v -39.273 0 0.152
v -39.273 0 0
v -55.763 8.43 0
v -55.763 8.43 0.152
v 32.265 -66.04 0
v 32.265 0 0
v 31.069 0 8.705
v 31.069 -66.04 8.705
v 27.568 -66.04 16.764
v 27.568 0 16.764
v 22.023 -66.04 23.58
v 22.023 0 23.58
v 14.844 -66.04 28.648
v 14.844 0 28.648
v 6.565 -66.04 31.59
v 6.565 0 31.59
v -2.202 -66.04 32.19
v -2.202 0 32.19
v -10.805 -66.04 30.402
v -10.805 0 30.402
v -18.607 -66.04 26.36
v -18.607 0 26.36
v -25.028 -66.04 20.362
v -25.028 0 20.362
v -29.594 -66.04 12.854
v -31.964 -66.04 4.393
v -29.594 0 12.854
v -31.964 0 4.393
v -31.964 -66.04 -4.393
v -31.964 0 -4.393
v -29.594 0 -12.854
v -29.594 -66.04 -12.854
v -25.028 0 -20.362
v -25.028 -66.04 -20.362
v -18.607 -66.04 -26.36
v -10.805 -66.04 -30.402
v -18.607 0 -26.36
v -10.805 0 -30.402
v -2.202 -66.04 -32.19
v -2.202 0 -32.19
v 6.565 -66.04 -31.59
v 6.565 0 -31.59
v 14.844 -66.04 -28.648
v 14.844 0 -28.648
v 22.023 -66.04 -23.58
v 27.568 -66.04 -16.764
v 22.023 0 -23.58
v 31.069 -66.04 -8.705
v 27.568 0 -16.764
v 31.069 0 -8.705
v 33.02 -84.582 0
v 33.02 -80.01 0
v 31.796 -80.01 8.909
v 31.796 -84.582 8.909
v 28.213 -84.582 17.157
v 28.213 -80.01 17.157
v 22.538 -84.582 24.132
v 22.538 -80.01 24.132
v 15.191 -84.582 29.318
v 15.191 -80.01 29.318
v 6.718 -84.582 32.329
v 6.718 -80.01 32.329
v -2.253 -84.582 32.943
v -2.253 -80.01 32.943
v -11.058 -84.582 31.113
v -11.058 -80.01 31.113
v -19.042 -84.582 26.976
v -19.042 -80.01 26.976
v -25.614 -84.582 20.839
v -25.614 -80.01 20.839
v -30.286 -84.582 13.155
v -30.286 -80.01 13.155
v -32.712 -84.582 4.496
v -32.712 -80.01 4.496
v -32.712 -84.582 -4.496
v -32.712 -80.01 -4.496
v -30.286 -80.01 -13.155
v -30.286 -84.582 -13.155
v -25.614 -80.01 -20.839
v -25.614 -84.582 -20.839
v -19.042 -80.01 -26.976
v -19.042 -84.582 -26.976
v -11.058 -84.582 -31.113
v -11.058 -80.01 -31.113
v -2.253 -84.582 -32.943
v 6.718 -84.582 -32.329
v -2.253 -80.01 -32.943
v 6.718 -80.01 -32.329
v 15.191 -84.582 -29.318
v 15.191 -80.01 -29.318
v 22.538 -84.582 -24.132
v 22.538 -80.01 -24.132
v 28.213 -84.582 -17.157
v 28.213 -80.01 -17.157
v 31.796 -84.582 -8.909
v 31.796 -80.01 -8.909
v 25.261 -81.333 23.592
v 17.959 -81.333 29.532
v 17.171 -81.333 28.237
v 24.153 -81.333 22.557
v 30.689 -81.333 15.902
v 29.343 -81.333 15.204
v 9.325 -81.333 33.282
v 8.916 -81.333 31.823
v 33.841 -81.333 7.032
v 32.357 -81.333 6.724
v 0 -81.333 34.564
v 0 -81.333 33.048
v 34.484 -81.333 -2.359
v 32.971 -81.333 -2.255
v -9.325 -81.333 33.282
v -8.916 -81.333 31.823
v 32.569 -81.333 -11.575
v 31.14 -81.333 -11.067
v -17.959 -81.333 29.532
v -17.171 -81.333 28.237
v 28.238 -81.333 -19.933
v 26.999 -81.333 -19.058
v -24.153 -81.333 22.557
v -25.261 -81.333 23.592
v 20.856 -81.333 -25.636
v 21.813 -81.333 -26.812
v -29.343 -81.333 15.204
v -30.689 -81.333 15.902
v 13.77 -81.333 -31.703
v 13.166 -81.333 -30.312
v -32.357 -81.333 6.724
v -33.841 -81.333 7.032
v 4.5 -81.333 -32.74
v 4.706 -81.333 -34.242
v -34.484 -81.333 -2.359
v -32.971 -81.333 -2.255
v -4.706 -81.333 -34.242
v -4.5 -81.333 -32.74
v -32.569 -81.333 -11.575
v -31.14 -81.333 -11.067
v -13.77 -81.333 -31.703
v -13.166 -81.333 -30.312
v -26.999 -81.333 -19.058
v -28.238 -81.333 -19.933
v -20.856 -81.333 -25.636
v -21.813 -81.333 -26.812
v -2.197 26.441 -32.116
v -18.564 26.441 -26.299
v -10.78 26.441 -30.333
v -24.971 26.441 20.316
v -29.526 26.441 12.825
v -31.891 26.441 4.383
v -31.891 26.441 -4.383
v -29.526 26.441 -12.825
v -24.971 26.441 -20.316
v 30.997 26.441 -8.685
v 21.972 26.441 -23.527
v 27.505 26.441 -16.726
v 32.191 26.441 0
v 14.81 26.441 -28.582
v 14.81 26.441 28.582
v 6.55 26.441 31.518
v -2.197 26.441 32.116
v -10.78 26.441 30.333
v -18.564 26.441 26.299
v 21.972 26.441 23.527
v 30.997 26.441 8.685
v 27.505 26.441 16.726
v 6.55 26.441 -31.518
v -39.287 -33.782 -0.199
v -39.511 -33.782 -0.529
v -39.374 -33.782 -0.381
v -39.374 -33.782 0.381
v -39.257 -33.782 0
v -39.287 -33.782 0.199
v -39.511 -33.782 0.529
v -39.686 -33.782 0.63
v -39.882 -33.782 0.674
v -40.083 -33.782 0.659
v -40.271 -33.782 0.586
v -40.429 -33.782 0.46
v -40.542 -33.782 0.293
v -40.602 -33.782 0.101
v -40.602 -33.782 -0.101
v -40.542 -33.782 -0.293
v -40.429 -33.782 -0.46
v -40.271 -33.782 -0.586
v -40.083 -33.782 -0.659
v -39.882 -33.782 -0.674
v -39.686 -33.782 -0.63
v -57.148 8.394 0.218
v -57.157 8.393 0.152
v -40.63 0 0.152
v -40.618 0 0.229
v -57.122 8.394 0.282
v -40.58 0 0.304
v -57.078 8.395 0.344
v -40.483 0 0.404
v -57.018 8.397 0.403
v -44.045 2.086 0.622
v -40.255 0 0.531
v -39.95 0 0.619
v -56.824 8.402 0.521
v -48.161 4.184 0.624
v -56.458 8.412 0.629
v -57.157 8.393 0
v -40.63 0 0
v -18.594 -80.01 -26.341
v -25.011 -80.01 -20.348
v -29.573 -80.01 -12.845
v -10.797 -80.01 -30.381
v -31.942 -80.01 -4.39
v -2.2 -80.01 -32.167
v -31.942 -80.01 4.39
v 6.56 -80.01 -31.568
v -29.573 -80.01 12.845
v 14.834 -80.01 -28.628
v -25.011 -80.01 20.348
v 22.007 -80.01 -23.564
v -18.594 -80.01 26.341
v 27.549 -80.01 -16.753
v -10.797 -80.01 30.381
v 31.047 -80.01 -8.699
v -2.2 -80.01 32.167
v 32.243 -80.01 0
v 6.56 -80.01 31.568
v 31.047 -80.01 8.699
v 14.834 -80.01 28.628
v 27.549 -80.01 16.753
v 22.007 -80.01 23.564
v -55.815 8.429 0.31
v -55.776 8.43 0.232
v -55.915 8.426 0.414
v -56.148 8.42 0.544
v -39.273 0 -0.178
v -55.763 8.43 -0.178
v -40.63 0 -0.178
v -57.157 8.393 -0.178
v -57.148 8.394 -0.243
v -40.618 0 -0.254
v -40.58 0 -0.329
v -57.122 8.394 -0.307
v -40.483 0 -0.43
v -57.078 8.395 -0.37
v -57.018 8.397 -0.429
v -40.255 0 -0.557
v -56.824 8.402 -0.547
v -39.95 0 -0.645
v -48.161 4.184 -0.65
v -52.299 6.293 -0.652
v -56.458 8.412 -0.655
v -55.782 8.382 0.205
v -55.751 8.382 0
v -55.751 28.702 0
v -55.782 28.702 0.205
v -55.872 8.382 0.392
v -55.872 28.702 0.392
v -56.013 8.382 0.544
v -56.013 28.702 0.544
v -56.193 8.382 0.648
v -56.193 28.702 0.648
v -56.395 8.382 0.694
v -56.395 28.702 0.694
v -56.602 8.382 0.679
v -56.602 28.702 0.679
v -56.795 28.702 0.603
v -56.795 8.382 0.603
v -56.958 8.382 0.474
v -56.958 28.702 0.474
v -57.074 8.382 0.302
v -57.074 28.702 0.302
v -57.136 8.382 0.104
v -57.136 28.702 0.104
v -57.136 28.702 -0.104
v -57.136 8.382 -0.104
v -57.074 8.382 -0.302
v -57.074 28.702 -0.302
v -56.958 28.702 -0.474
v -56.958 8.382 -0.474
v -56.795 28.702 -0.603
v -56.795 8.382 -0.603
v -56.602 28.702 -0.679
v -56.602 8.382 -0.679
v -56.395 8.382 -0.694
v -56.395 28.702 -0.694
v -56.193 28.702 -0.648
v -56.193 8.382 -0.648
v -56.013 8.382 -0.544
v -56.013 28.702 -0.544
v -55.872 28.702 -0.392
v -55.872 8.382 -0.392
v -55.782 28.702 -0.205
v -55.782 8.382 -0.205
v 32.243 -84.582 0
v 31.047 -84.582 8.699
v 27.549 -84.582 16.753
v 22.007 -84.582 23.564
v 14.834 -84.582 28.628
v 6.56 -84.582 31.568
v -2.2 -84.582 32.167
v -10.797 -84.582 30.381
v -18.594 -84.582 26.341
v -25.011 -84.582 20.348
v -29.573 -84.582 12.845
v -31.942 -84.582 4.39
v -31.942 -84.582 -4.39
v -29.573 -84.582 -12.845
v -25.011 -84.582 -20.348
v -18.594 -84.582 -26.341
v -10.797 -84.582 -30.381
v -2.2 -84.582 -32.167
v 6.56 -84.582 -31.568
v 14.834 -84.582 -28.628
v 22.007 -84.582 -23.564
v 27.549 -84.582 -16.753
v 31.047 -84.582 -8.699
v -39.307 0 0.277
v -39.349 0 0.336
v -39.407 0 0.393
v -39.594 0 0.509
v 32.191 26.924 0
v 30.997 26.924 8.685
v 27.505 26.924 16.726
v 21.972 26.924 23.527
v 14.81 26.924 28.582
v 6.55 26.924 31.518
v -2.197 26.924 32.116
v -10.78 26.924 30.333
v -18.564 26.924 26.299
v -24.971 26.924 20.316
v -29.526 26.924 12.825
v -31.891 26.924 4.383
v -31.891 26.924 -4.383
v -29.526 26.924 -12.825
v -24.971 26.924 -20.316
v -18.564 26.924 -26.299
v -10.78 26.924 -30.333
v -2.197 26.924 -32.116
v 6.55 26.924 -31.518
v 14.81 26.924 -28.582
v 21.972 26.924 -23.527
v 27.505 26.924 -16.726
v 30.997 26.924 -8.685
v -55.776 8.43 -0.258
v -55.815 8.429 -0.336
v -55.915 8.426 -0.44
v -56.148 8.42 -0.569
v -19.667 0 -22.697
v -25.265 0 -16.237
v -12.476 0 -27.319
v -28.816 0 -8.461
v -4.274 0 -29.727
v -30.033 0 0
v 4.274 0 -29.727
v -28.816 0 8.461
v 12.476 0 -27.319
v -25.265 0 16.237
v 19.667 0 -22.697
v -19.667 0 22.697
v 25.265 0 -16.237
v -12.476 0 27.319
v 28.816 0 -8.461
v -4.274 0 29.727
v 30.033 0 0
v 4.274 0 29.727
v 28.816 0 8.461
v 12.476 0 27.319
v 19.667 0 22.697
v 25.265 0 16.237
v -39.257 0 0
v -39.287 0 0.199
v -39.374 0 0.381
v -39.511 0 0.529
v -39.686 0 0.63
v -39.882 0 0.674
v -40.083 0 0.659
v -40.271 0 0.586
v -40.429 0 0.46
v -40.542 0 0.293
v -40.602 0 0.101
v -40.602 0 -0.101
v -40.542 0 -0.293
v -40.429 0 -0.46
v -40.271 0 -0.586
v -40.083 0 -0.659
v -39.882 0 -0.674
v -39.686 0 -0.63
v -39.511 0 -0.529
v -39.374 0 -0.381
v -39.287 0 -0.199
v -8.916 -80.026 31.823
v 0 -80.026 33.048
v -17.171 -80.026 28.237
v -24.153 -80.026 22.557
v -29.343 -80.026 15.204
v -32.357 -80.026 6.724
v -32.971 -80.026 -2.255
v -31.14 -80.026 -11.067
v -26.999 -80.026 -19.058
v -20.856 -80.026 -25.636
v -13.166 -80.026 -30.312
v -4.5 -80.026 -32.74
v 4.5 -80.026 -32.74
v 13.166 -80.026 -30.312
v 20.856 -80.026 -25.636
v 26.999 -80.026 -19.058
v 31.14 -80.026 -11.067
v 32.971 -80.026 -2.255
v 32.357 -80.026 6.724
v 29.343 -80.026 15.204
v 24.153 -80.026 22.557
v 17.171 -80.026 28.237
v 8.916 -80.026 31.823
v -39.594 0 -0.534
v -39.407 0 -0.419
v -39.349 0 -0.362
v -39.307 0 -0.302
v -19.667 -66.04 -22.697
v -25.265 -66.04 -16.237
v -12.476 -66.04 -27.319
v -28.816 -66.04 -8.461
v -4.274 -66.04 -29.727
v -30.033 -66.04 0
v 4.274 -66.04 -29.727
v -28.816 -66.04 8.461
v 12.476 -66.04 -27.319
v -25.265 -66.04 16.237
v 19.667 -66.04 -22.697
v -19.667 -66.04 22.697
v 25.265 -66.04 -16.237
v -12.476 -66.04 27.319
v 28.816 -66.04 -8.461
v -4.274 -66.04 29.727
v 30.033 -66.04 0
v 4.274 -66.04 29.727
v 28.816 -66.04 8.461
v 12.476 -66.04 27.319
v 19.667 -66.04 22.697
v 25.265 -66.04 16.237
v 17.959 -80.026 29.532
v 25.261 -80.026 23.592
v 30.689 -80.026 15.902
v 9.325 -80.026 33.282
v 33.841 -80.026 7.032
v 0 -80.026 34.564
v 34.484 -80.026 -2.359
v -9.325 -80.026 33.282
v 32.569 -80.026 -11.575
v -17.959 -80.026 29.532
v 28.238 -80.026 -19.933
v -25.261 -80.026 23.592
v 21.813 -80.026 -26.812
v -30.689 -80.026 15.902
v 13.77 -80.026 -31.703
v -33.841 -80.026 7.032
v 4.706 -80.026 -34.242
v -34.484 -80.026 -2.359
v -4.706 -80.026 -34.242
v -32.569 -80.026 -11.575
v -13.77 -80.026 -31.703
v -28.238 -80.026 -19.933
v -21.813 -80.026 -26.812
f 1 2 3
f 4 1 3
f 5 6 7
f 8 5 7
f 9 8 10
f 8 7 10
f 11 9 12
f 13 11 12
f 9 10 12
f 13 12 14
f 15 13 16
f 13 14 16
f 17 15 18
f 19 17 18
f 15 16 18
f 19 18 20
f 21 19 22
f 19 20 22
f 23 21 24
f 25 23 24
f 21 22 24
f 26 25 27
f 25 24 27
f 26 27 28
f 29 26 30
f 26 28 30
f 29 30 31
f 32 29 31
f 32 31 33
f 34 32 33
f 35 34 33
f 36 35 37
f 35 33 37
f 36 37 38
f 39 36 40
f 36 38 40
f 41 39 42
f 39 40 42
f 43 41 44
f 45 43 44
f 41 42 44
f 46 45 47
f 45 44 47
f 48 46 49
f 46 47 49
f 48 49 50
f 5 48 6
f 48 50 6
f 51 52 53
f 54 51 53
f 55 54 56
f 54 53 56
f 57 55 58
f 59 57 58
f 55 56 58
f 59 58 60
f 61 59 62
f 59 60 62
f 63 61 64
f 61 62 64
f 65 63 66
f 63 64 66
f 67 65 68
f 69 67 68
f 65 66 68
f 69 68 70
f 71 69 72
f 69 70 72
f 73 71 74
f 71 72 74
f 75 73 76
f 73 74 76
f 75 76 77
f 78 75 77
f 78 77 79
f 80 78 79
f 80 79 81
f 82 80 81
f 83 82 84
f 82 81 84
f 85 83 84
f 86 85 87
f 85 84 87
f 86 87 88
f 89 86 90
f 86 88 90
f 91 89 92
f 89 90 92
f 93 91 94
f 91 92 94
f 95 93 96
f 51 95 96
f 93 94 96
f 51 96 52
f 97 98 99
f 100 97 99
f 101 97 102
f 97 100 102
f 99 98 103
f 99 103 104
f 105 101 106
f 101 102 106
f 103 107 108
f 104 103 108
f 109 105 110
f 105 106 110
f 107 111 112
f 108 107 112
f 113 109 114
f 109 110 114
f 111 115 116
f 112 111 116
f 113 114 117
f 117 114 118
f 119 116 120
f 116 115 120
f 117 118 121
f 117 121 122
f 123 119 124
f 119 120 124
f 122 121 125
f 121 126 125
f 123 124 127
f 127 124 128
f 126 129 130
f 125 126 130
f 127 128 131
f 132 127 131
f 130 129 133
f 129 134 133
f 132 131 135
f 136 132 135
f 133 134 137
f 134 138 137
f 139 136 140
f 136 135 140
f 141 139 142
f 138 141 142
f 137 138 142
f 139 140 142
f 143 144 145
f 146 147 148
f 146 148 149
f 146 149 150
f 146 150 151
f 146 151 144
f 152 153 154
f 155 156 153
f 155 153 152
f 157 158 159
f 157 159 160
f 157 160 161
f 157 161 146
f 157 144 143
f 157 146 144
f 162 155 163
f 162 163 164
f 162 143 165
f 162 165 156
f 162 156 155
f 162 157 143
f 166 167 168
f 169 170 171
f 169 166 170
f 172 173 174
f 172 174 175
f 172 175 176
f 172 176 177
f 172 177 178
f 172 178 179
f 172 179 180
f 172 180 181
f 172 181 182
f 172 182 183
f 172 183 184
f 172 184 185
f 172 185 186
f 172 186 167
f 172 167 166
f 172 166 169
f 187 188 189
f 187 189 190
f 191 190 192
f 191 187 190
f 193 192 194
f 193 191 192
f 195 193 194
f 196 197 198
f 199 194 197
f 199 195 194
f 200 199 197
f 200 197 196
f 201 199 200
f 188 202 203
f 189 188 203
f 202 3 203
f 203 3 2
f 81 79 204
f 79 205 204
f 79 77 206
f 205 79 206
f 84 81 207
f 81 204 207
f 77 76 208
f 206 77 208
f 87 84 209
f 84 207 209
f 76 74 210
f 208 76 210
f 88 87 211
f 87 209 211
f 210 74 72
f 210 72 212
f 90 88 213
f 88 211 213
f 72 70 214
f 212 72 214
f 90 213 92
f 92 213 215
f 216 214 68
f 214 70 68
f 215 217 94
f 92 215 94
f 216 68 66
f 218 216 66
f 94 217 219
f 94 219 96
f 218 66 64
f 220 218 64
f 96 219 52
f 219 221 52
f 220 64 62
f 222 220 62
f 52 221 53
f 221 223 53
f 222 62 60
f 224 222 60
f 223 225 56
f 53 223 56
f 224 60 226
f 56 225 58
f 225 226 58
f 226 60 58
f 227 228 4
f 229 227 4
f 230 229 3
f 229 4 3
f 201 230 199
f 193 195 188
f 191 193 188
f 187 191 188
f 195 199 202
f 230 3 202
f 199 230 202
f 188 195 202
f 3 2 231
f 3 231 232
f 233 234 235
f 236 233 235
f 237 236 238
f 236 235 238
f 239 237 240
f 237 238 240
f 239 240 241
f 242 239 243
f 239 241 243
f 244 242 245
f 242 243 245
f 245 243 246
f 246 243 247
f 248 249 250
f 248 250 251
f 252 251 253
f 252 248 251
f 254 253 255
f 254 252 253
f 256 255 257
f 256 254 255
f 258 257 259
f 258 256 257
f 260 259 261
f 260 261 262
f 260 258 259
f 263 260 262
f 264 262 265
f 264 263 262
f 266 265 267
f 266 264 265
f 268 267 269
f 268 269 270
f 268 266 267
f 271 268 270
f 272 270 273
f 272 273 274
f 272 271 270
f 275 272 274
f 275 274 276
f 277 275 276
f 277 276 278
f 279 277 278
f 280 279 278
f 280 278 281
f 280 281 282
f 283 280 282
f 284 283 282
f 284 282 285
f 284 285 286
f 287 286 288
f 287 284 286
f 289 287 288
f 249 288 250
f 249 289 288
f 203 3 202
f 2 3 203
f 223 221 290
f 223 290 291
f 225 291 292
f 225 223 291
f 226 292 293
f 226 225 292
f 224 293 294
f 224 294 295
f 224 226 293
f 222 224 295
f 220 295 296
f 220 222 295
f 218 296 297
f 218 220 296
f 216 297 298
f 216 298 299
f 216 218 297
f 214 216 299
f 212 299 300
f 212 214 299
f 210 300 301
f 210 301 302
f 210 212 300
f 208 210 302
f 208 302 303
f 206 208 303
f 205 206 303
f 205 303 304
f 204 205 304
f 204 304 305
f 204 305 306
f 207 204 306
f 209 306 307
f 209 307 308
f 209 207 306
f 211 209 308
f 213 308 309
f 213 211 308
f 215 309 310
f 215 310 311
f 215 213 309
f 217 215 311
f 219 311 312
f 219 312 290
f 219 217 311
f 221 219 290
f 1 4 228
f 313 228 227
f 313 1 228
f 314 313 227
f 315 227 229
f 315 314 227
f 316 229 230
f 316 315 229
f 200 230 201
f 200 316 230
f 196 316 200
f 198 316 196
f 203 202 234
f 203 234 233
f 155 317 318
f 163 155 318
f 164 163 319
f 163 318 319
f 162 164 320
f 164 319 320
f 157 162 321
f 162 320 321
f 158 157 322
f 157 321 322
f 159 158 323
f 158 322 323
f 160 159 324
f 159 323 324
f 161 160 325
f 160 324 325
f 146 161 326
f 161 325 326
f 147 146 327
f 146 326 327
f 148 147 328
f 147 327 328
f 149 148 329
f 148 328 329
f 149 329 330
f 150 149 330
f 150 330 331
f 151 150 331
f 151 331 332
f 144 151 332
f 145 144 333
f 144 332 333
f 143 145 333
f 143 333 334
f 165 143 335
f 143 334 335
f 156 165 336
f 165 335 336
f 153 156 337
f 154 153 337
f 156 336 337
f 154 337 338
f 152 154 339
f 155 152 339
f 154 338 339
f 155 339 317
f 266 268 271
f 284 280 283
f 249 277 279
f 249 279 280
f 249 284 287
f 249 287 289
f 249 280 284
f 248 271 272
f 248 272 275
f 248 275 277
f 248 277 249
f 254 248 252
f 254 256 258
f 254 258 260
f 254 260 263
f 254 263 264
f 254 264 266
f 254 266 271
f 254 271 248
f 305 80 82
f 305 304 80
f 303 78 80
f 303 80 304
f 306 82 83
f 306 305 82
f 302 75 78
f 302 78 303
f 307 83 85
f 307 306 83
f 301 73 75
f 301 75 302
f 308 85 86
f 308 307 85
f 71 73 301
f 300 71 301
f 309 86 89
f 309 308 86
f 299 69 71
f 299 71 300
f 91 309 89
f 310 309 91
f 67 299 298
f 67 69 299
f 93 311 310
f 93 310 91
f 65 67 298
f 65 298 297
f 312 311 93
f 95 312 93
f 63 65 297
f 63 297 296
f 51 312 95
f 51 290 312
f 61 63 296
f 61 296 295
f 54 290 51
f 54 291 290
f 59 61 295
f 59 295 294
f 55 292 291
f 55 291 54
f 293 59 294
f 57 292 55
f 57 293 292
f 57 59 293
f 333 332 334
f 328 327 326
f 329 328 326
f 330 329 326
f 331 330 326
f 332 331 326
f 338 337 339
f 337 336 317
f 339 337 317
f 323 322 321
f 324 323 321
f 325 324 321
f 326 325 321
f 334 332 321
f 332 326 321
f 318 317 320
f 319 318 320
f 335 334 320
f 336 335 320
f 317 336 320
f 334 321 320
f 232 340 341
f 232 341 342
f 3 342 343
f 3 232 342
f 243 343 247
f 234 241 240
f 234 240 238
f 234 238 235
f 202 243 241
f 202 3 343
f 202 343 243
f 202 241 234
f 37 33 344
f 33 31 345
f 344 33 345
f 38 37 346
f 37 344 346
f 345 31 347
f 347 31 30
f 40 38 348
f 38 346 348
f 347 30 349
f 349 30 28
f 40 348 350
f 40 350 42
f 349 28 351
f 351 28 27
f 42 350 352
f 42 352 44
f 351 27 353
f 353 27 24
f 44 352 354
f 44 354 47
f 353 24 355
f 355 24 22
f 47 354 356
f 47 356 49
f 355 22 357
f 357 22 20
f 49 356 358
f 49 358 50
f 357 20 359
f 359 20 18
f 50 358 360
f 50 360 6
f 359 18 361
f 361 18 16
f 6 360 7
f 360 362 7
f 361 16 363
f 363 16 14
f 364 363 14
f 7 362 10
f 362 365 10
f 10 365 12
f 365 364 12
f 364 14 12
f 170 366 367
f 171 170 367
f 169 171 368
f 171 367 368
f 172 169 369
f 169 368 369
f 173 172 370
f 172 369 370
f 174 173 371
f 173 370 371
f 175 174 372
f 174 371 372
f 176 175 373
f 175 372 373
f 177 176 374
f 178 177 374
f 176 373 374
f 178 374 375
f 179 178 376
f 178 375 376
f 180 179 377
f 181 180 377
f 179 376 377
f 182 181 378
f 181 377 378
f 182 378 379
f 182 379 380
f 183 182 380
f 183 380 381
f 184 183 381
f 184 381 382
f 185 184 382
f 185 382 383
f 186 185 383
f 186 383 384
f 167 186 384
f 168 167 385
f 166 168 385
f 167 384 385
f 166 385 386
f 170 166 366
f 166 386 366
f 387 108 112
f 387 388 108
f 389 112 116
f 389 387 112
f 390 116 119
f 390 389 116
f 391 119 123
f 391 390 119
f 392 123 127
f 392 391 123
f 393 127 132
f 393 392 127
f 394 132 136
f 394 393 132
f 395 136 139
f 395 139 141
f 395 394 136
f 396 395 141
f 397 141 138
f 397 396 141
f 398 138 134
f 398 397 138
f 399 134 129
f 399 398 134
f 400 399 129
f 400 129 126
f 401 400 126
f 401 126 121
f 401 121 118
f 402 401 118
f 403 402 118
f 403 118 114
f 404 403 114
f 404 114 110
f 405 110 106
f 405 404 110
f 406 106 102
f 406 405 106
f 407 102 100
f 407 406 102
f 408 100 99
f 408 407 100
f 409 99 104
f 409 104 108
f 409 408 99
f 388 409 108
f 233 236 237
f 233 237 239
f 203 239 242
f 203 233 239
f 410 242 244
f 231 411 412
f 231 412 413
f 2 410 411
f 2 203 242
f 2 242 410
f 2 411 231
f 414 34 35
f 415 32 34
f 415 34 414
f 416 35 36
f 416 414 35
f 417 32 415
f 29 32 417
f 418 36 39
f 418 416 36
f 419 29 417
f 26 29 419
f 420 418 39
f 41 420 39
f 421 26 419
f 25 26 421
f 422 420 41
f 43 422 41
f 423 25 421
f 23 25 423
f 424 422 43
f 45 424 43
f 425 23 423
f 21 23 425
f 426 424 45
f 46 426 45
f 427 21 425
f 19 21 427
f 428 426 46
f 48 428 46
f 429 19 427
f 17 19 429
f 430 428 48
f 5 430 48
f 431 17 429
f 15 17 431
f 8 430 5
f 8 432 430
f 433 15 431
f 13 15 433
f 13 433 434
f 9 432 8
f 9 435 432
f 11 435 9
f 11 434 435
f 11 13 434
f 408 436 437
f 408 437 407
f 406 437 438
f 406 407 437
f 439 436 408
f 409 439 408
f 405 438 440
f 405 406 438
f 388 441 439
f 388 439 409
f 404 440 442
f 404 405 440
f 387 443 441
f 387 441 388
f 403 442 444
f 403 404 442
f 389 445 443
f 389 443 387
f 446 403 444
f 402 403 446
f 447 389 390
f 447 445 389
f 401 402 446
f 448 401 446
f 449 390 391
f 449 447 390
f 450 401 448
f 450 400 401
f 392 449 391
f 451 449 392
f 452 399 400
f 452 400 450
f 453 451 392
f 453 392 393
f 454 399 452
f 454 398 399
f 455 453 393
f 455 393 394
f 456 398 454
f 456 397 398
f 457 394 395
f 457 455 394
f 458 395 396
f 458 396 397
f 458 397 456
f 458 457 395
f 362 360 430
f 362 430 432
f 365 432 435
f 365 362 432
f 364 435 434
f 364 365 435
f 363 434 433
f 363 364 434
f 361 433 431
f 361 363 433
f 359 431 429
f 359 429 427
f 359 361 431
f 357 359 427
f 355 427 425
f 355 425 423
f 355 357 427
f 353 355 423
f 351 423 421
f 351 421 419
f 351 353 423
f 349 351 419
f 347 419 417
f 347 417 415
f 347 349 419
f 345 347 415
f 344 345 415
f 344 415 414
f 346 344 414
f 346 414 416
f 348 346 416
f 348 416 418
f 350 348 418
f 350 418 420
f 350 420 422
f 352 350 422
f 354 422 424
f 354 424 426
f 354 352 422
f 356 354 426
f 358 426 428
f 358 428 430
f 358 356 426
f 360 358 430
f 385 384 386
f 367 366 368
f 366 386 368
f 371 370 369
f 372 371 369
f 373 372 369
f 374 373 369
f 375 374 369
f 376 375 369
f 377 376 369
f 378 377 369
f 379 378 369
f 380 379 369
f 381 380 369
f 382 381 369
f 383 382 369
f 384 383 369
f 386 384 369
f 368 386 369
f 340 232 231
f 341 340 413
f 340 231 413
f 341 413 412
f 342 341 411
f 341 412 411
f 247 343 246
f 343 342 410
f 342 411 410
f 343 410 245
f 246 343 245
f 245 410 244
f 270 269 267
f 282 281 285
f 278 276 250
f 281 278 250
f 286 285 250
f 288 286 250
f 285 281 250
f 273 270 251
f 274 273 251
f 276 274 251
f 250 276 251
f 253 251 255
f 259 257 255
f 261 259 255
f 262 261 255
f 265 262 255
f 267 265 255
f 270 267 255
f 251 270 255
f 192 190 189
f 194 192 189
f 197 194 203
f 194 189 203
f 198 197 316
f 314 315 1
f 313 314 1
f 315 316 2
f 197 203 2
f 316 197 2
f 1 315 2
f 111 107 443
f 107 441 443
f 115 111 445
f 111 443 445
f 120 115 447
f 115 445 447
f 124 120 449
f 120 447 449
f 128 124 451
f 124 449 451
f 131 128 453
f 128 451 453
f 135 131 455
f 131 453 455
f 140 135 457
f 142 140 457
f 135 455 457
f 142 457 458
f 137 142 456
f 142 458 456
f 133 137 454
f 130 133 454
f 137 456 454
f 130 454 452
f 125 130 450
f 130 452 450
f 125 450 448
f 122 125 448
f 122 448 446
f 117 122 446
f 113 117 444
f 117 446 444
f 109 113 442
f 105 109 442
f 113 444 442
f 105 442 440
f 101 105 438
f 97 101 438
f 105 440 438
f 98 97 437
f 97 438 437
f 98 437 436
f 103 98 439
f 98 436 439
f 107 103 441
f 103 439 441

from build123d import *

# Parameters (mm, degrees)
F0_R           = 32.2649845467
F0_R_2         = 30.0329002684
F1_DEPTH       = 66.04
F3_R           = 33.02
F3_R_2         = 32.2425514632
F4_DEPTH       = 4.572
F5_W           = 1.3068169355
F5_H           = 1.5159137547
F9_R           = 32.1912372863
F10_DEPTH      = 0.4826
F11_R          = 0.6763051709
F12_DEPTH      = 33.782
F14_R          = 0.6962354259
F15_DEPTH      = 20.32
F17_DEPTH      = 0.6604
F18_DEPTH      = 0.6858
F19_T1_DEPTH   = 21.0597633564
F19_T3_DEPTH   = 21.0757959369
F19_2_T1_DEPTH = 21.0597633564
F19_2_T3_DEPTH = 21.0757959369


# Not quite as in the source:
# - a fillet or chamfer that OpenCascade refuses, or shapes differently, is made with other operations: its cross-section is extruded or revolved along the edge and cut away or added


with BuildPart() as f1:
    # F0 (on Front) → F1 (new body)
    with BuildSketch(Plane.XZ):
        Circle(F0_R)
        Circle(F0_R_2, mode=Mode.SUBTRACT)
    extrude(amount=F1_DEPTH)


with BuildPart() as f4:
    # F3 (on offset) → F4 (new body)
    with BuildSketch(Plane.XZ.offset(80.01)):
        Circle(F3_R)
        Circle(F3_R_2, mode=Mode.SUBTRACT)
    extrude(amount=F4_DEPTH)


with BuildPart() as f7:
    # F5 (on Right) → F7 (revolve)
    with BuildSketch(Plane.YZ):
        with Locations((-80.6791931391, 33.8062625378)):
            Rectangle(F5_W, F5_H)
    revolve(axis=Axis((0, -220.3602194786, 0), (0, -1, 0)))


with BuildPart() as f10:
    # F9 (on offset) → F10 (new body)
    with BuildSketch(Plane.XZ.offset(-26.924)):
        Circle(F9_R)
    extrude(amount=F10_DEPTH)


with BuildPart() as f12:
    # F11 (on Front) → F12 (new body)
    with BuildSketch(Plane.XZ):
        with Locations((-39.9328246713, 0)):
            Circle(F11_R)
    extrude(amount=F12_DEPTH)


with BuildPart() as f15:
    # F14 (on offset) → F15 (new body)
    with BuildSketch(Plane.XZ.offset(-8.382)):
        with Locations((-56.4471445978, 0)):
            Circle(F14_R)
    extrude(amount=-F15_DEPTH)


with BuildPart() as f17:
    # F16 (on Top) → F17 (new body)
    with BuildSketch(Plane.XY):
        Polygon((-39.2730757594, 0), (-55.7629354298, 8.4300749004), (-57.1569614112, 8.3933901042), (-40.630415082, 0), align=None)
    extrude(amount=F17_DEPTH)


with BuildPart() as f18:
    # F18 (new): a face of the model
    f18_faces = [f17.part.faces().sort_by_distance(p)[0] for p in [
        (-48.3112762863, 4.2598390002, 0),
    ]]
    extrude(f18_faces, amount=F18_DEPTH)

    # F19: fillet of radius 0.508 on 2 edges, made by hand

    # F19_s2 → F19_t1 (cut)
    with BuildSketch(Plane(origin=(-30.0048537502, 15.3393157701, 0), x_dir=(0, 0, 1), z_dir=(-0.8903925689, 0.455193446, 0))):
        with BuildLine():
            ThreePointArc((-0.1778, -17.876846688), (-0.5370102448, -18.0256364432), (-0.6858, -18.384846688))
            Line((-0.6858, -18.384846688), (-0.6858, -17.876846688))
            Line((-0.6858, -17.876846688), (-0.1778, -17.876846688))
        make_face()
    extrude(amount=F19_T1_DEPTH, mode=Mode.SUBTRACT)

    # F19_s4 → F19_t3 (cut)
    with BuildSketch(Plane(origin=(-49.9581715428, 25.3724168557, 0), x_dir=(0, 0, 1), z_dir=(0.8916016547, -0.4528205928, 0))):
        with BuildLine():
            ThreePointArc((-0.1778, 18.3982886432), (-0.5370102448, 18.249498888), (-0.6858, 17.8902886432))
            Line((-0.6858, 17.8902886432), (-0.6858, 18.3982886432))
            Line((-0.6858, 18.3982886432), (-0.1778, 18.3982886432))
        make_face()
    extrude(amount=F19_T3_DEPTH, mode=Mode.SUBTRACT)


with BuildPart() as f17_1:
    add(f17.part)

    # F19#2: fillet of radius 0.508 on 2 edges, made by hand

    # F19_2_s2 → F19_2_t1 (cut)
    with BuildSketch(Plane(origin=(-30.0048537502, 15.3393157701, 0), x_dir=(0, 0, 1), z_dir=(-0.8903925689, 0.455193446, 0))):
        with BuildLine():
            ThreePointArc((0.1524, -17.876846688), (0.5116102448, -18.0256364432), (0.6604, -18.384846688))
            Line((0.6604, -18.384846688), (0.6604, -17.876846688))
            Line((0.6604, -17.876846688), (0.1524, -17.876846688))
        make_face()
    extrude(amount=F19_2_T1_DEPTH, mode=Mode.SUBTRACT)

    # F19_2_s4 → F19_2_t3 (cut)
    with BuildSketch(Plane(origin=(-49.9581715428, 25.3724168557, 0), x_dir=(0, 0, 1), z_dir=(0.8916016547, -0.4528205928, 0))):
        with BuildLine():
            ThreePointArc((0.1524, 18.3982886432), (0.5116102448, 18.249498888), (0.6604, 17.8902886432))
            Line((0.6604, 17.8902886432), (0.6604, 18.3982886432))
            Line((0.6604, 18.3982886432), (0.1524, 18.3982886432))
        make_face()
    extrude(amount=F19_2_T3_DEPTH, mode=Mode.SUBTRACT)


solid = Compound([f1.part, f4.part, f7.part, f10.part, f12.part, f15.part, f18.part, f17_1.part])
